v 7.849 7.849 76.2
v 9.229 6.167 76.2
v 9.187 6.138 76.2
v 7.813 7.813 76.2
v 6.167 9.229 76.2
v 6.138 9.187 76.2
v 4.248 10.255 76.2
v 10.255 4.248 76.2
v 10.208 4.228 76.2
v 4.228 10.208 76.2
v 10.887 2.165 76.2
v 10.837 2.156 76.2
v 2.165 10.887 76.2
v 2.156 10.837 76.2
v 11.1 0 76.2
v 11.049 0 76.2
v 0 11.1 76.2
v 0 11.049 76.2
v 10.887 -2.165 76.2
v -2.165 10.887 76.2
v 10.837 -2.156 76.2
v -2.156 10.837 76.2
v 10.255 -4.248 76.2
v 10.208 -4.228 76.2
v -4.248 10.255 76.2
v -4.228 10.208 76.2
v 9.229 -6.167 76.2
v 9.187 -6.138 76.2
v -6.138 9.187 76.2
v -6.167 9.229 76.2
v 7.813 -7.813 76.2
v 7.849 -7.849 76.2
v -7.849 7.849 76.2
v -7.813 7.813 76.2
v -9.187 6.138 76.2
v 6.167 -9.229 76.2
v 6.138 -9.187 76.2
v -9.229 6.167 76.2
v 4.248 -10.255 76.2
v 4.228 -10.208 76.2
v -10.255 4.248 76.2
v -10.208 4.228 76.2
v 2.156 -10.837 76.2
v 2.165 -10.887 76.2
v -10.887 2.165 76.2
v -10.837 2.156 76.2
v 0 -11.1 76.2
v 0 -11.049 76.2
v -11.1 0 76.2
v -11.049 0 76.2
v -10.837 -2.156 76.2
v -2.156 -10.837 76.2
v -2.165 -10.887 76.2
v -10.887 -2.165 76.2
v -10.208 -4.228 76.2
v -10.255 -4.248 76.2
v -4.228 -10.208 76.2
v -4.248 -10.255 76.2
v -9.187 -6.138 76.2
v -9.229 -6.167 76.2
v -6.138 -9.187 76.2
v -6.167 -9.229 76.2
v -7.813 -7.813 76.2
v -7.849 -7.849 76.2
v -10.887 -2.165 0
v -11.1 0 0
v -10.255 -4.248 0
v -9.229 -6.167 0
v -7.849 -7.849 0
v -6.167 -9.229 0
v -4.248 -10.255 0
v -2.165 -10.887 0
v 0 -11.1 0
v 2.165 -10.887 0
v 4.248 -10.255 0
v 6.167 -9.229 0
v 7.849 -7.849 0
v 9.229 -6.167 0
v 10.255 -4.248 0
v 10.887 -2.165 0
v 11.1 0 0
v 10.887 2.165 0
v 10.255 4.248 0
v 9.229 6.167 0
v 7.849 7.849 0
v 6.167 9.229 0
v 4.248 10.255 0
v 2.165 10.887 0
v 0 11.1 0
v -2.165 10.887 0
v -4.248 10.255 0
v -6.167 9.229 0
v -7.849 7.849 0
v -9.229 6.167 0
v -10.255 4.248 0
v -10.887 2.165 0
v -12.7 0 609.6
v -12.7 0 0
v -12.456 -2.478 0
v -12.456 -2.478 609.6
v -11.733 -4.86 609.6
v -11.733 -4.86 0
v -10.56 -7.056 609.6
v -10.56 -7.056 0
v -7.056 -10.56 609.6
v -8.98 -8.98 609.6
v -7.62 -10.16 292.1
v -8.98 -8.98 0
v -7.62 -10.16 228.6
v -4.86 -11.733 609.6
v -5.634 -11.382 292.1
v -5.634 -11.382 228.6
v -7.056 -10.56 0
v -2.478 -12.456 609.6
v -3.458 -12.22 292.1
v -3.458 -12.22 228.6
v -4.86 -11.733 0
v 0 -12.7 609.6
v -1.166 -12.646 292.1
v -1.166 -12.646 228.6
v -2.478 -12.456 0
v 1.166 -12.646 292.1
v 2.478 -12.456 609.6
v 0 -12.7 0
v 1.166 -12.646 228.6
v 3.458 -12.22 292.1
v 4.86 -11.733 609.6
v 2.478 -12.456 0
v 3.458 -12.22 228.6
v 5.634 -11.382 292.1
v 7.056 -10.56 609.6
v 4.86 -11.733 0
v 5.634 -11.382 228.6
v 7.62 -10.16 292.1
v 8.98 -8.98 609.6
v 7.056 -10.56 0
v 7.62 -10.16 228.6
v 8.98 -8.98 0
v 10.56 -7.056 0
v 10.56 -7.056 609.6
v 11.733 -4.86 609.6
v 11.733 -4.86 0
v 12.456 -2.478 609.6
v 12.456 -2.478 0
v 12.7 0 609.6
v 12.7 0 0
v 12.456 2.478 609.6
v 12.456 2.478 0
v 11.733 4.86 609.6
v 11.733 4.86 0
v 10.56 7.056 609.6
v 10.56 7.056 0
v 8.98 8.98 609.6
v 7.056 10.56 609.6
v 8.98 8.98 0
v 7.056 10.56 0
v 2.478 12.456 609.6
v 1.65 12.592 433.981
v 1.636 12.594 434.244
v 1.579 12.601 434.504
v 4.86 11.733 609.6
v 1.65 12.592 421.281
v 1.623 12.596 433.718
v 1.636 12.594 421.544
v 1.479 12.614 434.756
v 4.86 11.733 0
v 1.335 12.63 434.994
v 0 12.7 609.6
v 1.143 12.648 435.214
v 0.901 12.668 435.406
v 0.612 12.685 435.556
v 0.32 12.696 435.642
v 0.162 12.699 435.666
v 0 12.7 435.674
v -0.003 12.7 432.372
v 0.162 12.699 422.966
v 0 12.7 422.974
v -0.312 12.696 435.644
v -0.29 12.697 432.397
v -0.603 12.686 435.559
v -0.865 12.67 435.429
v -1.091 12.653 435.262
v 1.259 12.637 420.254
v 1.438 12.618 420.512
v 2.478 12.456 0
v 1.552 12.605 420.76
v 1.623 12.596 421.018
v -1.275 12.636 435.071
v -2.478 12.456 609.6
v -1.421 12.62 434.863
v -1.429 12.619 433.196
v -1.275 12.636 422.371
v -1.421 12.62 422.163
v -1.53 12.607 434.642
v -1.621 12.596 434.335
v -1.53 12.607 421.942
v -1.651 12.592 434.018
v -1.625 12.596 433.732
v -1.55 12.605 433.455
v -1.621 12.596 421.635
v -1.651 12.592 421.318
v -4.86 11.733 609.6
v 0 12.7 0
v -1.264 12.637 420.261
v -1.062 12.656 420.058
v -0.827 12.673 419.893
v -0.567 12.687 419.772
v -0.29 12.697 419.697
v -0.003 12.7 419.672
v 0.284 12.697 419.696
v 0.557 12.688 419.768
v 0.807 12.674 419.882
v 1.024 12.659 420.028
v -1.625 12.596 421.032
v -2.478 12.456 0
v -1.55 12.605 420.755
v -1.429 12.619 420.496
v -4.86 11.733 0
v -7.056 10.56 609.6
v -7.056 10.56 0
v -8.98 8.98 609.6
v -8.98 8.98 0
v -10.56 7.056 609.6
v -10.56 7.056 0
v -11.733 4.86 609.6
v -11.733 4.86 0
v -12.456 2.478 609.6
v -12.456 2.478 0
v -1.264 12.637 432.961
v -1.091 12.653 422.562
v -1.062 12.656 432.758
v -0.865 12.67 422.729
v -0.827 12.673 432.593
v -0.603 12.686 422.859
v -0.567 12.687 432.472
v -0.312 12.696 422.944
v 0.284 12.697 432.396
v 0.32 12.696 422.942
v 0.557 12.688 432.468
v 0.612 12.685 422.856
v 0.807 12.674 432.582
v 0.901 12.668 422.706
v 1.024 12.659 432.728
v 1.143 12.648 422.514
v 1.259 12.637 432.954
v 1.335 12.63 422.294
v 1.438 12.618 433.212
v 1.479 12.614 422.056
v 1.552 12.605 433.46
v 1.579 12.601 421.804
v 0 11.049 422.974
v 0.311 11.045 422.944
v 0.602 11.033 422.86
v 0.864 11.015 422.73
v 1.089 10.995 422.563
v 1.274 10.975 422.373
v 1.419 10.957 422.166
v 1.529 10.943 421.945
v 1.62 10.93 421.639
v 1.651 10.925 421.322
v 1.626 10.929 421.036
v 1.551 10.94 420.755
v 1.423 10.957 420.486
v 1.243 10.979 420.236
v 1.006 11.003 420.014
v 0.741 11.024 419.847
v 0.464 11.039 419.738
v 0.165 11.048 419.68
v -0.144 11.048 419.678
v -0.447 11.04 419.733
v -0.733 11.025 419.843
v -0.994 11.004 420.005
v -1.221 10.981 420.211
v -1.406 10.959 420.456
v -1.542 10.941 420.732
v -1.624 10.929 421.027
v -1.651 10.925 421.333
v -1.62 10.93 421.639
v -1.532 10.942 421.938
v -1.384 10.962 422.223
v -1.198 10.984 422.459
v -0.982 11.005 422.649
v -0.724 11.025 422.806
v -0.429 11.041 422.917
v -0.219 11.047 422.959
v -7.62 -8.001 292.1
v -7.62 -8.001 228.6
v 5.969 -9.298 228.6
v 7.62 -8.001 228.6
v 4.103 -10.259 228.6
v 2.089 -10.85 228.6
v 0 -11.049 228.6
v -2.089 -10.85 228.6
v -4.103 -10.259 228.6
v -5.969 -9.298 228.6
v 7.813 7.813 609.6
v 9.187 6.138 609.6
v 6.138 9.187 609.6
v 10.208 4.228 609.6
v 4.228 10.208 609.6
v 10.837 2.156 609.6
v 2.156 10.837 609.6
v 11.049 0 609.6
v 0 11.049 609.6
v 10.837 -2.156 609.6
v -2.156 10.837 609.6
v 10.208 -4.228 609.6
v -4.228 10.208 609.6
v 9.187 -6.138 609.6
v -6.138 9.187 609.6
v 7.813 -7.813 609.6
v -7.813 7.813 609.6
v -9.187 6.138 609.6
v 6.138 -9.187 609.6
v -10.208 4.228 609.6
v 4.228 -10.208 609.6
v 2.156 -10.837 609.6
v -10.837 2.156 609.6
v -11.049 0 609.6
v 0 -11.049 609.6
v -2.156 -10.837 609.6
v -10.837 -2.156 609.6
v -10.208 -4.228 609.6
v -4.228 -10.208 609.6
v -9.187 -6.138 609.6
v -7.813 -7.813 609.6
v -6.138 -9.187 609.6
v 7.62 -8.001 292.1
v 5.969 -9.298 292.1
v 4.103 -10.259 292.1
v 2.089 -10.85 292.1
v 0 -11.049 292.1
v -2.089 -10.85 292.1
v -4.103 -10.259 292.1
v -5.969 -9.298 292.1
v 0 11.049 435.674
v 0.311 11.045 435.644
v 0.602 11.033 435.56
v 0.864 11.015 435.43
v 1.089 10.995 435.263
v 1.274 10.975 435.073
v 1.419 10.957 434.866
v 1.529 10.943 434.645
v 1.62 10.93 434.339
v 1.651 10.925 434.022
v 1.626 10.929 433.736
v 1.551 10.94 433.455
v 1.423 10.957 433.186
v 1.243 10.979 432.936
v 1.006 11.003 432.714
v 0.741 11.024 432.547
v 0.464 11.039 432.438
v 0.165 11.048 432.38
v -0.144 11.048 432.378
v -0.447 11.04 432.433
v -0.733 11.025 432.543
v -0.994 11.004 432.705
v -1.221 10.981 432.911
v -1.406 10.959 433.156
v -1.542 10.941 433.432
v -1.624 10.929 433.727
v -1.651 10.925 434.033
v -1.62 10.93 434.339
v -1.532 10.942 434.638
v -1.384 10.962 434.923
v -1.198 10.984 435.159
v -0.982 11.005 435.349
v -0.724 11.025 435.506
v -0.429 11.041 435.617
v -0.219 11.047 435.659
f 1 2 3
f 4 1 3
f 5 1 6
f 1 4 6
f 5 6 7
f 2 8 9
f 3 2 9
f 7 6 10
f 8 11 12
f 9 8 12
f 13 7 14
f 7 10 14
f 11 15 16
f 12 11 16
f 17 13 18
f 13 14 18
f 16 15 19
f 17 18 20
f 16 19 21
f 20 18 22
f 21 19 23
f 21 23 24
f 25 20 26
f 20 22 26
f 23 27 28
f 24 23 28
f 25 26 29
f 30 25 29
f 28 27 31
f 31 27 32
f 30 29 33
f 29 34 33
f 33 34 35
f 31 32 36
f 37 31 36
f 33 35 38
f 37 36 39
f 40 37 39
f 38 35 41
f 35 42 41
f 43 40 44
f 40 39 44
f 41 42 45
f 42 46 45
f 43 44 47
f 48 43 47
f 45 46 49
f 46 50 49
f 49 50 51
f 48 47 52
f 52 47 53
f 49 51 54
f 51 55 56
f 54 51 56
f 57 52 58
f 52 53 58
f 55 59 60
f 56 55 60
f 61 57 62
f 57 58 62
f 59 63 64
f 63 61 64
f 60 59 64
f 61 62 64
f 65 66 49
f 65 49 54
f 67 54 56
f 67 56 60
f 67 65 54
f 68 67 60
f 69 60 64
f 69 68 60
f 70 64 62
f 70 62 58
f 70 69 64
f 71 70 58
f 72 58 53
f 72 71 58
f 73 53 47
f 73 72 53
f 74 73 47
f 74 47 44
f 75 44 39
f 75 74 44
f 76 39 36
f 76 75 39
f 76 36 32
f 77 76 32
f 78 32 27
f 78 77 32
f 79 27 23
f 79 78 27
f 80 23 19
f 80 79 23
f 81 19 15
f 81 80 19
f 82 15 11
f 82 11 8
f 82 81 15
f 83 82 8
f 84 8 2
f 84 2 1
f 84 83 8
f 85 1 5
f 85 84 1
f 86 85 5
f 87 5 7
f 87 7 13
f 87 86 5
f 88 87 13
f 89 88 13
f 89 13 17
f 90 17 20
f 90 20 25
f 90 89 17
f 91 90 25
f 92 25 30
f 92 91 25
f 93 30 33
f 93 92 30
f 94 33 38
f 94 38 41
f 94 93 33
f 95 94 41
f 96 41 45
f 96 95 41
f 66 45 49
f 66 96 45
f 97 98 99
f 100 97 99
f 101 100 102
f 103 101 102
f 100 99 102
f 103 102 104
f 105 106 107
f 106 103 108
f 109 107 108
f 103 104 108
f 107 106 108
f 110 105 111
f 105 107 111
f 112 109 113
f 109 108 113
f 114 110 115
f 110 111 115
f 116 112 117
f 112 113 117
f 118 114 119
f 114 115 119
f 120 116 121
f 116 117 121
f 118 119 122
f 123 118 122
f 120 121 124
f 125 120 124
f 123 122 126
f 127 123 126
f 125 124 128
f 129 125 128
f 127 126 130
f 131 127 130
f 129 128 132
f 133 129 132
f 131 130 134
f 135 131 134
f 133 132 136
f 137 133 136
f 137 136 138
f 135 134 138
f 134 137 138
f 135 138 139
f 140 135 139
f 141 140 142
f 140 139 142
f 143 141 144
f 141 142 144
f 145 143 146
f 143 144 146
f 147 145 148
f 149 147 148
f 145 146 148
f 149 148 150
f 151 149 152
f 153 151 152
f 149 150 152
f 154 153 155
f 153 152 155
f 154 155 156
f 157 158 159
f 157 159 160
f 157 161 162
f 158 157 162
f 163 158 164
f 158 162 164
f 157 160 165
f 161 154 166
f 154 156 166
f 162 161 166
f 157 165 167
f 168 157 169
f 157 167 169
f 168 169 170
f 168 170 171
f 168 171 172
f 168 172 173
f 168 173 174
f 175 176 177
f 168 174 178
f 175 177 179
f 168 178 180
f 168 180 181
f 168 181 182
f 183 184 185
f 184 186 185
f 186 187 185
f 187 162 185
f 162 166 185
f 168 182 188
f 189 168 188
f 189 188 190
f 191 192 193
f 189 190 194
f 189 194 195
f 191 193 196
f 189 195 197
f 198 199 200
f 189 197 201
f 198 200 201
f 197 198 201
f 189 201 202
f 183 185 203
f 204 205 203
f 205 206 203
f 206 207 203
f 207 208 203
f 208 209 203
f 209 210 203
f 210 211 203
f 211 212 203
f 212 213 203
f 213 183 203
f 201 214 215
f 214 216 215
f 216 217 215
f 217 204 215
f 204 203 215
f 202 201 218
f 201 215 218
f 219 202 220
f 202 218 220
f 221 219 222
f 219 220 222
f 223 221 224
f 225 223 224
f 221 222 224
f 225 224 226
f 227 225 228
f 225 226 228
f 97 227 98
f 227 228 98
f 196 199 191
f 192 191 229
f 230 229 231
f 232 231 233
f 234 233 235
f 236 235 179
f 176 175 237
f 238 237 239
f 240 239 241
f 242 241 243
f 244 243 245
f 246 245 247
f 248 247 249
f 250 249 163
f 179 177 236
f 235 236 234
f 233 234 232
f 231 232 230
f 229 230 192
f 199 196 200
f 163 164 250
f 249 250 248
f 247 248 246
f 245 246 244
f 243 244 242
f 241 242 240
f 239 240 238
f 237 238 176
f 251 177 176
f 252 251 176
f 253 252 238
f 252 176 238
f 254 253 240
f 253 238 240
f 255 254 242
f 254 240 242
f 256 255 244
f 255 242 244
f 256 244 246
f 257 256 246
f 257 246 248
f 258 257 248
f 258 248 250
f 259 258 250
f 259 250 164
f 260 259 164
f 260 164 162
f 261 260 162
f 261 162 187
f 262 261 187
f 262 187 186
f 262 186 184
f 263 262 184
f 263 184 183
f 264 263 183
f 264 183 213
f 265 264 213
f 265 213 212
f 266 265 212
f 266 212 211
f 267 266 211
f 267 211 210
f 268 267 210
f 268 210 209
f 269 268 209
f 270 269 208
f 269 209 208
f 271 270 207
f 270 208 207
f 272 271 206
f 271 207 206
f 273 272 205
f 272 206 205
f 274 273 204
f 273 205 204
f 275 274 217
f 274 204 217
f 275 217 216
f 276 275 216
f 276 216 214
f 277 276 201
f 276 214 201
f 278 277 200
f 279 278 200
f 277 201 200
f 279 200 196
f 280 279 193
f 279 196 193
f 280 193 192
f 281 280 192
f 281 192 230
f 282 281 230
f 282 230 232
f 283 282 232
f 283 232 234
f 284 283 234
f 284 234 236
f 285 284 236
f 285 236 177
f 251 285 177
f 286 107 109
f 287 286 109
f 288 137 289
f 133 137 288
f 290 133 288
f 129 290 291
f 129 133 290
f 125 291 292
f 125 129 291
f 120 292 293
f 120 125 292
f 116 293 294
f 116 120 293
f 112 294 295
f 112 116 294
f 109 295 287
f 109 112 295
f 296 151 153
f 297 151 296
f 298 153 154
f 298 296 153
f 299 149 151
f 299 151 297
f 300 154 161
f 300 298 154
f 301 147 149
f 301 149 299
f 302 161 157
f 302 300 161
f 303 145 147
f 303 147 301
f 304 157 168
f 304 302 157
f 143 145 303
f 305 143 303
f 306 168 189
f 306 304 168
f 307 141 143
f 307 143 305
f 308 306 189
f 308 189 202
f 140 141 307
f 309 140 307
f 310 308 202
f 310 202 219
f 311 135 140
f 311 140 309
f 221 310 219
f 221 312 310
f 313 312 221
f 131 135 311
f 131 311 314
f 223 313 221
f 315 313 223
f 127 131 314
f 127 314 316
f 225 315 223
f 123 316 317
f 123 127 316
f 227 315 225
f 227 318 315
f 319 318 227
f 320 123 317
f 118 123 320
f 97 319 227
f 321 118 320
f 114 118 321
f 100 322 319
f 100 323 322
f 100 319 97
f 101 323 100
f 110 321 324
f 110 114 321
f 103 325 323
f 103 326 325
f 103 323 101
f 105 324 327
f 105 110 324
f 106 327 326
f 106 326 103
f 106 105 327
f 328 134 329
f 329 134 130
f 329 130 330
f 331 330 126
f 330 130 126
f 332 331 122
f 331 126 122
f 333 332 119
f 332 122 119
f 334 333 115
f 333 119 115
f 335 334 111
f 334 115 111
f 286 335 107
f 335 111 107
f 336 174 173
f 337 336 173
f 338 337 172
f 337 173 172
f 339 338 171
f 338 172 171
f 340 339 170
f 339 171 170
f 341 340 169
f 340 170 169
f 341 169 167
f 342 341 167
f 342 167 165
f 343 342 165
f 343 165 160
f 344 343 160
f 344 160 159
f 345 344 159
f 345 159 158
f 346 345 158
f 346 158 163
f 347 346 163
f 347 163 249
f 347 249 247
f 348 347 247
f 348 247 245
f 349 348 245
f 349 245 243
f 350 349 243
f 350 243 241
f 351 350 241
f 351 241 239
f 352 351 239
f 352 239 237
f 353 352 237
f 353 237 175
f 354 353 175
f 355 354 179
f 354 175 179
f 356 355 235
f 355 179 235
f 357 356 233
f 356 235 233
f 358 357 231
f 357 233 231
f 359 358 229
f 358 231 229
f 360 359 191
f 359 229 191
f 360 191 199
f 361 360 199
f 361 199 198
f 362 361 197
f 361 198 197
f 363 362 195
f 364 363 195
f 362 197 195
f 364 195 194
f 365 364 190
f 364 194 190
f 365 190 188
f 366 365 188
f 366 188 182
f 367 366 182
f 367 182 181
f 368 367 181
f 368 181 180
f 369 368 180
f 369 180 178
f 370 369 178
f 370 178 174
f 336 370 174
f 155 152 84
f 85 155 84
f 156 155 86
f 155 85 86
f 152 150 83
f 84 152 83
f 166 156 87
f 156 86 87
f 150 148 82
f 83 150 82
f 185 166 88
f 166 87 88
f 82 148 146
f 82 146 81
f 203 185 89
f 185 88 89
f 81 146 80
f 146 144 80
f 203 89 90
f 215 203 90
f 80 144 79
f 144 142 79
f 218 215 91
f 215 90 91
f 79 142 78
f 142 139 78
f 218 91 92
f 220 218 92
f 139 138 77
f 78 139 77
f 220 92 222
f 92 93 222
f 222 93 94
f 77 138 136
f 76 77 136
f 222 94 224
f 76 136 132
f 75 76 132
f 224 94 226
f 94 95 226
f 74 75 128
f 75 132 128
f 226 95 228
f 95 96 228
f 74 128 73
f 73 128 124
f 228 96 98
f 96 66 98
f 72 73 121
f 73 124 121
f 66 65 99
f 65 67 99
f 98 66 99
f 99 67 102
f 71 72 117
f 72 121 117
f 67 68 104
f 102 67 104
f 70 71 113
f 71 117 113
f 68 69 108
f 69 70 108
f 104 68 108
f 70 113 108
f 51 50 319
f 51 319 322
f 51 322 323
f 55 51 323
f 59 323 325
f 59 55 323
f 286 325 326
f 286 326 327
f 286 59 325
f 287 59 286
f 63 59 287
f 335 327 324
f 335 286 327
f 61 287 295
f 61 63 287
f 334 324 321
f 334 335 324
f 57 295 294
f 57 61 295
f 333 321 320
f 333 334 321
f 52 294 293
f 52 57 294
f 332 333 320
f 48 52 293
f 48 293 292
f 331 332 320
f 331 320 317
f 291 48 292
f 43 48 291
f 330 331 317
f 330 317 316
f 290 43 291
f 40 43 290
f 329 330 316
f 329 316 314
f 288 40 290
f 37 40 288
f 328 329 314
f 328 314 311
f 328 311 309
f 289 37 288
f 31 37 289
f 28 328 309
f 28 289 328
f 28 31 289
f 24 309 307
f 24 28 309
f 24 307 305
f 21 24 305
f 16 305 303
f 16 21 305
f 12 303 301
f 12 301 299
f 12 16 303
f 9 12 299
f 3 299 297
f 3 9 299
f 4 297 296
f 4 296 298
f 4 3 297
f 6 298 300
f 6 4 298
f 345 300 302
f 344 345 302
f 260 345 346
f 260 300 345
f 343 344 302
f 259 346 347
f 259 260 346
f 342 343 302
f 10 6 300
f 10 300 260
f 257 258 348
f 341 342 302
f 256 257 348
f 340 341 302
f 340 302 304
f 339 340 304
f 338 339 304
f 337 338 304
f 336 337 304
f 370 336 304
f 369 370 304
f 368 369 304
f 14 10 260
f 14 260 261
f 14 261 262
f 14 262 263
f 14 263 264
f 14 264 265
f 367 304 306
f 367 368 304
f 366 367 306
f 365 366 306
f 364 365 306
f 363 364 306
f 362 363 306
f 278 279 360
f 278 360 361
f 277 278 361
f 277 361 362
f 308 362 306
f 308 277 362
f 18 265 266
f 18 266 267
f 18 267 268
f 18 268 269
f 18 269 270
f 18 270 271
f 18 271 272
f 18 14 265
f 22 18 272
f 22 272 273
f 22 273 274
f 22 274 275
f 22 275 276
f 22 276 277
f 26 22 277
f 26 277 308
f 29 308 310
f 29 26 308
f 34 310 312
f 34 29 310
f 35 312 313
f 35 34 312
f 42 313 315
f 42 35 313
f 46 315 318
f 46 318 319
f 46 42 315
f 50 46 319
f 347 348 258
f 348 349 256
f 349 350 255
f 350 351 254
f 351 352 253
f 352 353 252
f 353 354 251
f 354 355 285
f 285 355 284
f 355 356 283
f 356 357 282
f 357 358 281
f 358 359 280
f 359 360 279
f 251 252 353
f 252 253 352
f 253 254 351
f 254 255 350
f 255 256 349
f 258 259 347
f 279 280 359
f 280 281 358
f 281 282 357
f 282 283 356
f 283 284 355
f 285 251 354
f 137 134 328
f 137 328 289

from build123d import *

# Parameters (mm, degrees)
SKETCH1_R               = 12.7
SKETCH1_R_2             = 11.049
BOSS_EXTRUDE1_DEPTH     = 609.6
SKETCH2_R               = 11.0998
SKETCH2_R_2             = 11.049
CUT_EXTRUDE1_DEPTH      = 76.2
CUT_EXTRUDE2_REACH      = 612.261
CUT_EXTRUDE2_END_RADIUS = 11.049
SKETCH5_R               = 1.651
CUT_EXTRUDE3_REACH      = 612.261
CUT_EXTRUDE3_END_RADIUS = 11.049
SKETCH6_W               = 15.24
SKETCH6_H               = 63.5


with BuildPart() as part:
    # Sketch1 → Boss-Extrude1 (new body)
    with BuildSketch(Plane.XY):
        with Locations(Location((0, 0, 0), (0, 0, 180))):
            Circle(SKETCH1_R)
        with Locations(Location((0, 0, 0), (0, 0, 180))):
            Circle(SKETCH1_R_2, mode=Mode.SUBTRACT)
    extrude(amount=BOSS_EXTRUDE1_DEPTH)

    # Sketch2 → Cut-Extrude1 (cut)
    with BuildSketch(Plane.XY):
        with Locations(Location((0, 0, 0), (0, 0, 180))):
            Circle(SKETCH2_R)
        with Locations(Location((0, 0, 0), (0, 0, 180))):
            Circle(SKETCH2_R_2, mode=Mode.SUBTRACT)
    extrude(amount=CUT_EXTRUDE1_DEPTH, mode=Mode.SUBTRACT)

    # Cut-Extrude2: up to this cylinder (the profile starts outside it)
    cut_extrude2_end = Plane(origin=(0, 0, 427.6725), z_dir=(0, 0, -1)) * Cylinder(CUT_EXTRUDE2_END_RADIUS, 1260.32, mode=Mode.PRIVATE)
    # Sketch5 → Cut-Extrude2 (cut, up to the surface)
    with BuildSketch(Plane(origin=(0, 12.7, 0), x_dir=(1, 0, 0), z_dir=(0, 1, 0)), mode=Mode.PRIVATE) as cut_extrude2_sk1:
        with Locations(Location((0, -434.0225, 0), (0, 0, 270))):
            Circle(SKETCH5_R)
    cut_extrude2_tool1 = extrude(cut_extrude2_sk1.sketch, amount=-CUT_EXTRUDE2_REACH, mode=Mode.PRIVATE) - cut_extrude2_end
    add(cut_extrude2_tool1.solids().sort_by_distance((0, 12.7, 434.0225))[0], mode=Mode.SUBTRACT)
    # Sketch5 → Cut-Extrude2 (cut, up to the surface)
    with BuildSketch(Plane(origin=(0, 12.7, 0), x_dir=(1, 0, 0), z_dir=(0, 1, 0)), mode=Mode.PRIVATE) as cut_extrude2_sk2:
        with Locations(Location((0, -421.3225, 0), (0, 0, 270))):
            Circle(SKETCH5_R)
    cut_extrude2_tool2 = extrude(cut_extrude2_sk2.sketch, amount=-CUT_EXTRUDE2_REACH, mode=Mode.PRIVATE) - cut_extrude2_end
    add(cut_extrude2_tool2.solids().sort_by_distance((0, 12.7, 421.3225))[0], mode=Mode.SUBTRACT)

    # Cut-Extrude3: up to this cylinder (the profile starts outside it)
    cut_extrude3_end = Plane(origin=(0, 0, 260.35), z_dir=(0, 0, -1)) * Cylinder(CUT_EXTRUDE3_END_RADIUS, 1247.62, mode=Mode.PRIVATE)
    # Sketch6 → Cut-Extrude3 (cut, up to the surface)
    with BuildSketch(Plane(origin=(0, -12.7, 0), x_dir=(-1, 0, 0), z_dir=(0, -1, 0)), mode=Mode.PRIVATE) as cut_extrude3_sk1:
        with Locations((0, -260.35)):
            Rectangle(SKETCH6_W, SKETCH6_H)
    cut_extrude3_tool1 = extrude(cut_extrude3_sk1.sketch, amount=-CUT_EXTRUDE3_REACH, mode=Mode.PRIVATE) - cut_extrude3_end
    add(cut_extrude3_tool1.solids().sort_by_distance((0, -12.7, 260.35))[0], mode=Mode.SUBTRACT)


solid = part.part
